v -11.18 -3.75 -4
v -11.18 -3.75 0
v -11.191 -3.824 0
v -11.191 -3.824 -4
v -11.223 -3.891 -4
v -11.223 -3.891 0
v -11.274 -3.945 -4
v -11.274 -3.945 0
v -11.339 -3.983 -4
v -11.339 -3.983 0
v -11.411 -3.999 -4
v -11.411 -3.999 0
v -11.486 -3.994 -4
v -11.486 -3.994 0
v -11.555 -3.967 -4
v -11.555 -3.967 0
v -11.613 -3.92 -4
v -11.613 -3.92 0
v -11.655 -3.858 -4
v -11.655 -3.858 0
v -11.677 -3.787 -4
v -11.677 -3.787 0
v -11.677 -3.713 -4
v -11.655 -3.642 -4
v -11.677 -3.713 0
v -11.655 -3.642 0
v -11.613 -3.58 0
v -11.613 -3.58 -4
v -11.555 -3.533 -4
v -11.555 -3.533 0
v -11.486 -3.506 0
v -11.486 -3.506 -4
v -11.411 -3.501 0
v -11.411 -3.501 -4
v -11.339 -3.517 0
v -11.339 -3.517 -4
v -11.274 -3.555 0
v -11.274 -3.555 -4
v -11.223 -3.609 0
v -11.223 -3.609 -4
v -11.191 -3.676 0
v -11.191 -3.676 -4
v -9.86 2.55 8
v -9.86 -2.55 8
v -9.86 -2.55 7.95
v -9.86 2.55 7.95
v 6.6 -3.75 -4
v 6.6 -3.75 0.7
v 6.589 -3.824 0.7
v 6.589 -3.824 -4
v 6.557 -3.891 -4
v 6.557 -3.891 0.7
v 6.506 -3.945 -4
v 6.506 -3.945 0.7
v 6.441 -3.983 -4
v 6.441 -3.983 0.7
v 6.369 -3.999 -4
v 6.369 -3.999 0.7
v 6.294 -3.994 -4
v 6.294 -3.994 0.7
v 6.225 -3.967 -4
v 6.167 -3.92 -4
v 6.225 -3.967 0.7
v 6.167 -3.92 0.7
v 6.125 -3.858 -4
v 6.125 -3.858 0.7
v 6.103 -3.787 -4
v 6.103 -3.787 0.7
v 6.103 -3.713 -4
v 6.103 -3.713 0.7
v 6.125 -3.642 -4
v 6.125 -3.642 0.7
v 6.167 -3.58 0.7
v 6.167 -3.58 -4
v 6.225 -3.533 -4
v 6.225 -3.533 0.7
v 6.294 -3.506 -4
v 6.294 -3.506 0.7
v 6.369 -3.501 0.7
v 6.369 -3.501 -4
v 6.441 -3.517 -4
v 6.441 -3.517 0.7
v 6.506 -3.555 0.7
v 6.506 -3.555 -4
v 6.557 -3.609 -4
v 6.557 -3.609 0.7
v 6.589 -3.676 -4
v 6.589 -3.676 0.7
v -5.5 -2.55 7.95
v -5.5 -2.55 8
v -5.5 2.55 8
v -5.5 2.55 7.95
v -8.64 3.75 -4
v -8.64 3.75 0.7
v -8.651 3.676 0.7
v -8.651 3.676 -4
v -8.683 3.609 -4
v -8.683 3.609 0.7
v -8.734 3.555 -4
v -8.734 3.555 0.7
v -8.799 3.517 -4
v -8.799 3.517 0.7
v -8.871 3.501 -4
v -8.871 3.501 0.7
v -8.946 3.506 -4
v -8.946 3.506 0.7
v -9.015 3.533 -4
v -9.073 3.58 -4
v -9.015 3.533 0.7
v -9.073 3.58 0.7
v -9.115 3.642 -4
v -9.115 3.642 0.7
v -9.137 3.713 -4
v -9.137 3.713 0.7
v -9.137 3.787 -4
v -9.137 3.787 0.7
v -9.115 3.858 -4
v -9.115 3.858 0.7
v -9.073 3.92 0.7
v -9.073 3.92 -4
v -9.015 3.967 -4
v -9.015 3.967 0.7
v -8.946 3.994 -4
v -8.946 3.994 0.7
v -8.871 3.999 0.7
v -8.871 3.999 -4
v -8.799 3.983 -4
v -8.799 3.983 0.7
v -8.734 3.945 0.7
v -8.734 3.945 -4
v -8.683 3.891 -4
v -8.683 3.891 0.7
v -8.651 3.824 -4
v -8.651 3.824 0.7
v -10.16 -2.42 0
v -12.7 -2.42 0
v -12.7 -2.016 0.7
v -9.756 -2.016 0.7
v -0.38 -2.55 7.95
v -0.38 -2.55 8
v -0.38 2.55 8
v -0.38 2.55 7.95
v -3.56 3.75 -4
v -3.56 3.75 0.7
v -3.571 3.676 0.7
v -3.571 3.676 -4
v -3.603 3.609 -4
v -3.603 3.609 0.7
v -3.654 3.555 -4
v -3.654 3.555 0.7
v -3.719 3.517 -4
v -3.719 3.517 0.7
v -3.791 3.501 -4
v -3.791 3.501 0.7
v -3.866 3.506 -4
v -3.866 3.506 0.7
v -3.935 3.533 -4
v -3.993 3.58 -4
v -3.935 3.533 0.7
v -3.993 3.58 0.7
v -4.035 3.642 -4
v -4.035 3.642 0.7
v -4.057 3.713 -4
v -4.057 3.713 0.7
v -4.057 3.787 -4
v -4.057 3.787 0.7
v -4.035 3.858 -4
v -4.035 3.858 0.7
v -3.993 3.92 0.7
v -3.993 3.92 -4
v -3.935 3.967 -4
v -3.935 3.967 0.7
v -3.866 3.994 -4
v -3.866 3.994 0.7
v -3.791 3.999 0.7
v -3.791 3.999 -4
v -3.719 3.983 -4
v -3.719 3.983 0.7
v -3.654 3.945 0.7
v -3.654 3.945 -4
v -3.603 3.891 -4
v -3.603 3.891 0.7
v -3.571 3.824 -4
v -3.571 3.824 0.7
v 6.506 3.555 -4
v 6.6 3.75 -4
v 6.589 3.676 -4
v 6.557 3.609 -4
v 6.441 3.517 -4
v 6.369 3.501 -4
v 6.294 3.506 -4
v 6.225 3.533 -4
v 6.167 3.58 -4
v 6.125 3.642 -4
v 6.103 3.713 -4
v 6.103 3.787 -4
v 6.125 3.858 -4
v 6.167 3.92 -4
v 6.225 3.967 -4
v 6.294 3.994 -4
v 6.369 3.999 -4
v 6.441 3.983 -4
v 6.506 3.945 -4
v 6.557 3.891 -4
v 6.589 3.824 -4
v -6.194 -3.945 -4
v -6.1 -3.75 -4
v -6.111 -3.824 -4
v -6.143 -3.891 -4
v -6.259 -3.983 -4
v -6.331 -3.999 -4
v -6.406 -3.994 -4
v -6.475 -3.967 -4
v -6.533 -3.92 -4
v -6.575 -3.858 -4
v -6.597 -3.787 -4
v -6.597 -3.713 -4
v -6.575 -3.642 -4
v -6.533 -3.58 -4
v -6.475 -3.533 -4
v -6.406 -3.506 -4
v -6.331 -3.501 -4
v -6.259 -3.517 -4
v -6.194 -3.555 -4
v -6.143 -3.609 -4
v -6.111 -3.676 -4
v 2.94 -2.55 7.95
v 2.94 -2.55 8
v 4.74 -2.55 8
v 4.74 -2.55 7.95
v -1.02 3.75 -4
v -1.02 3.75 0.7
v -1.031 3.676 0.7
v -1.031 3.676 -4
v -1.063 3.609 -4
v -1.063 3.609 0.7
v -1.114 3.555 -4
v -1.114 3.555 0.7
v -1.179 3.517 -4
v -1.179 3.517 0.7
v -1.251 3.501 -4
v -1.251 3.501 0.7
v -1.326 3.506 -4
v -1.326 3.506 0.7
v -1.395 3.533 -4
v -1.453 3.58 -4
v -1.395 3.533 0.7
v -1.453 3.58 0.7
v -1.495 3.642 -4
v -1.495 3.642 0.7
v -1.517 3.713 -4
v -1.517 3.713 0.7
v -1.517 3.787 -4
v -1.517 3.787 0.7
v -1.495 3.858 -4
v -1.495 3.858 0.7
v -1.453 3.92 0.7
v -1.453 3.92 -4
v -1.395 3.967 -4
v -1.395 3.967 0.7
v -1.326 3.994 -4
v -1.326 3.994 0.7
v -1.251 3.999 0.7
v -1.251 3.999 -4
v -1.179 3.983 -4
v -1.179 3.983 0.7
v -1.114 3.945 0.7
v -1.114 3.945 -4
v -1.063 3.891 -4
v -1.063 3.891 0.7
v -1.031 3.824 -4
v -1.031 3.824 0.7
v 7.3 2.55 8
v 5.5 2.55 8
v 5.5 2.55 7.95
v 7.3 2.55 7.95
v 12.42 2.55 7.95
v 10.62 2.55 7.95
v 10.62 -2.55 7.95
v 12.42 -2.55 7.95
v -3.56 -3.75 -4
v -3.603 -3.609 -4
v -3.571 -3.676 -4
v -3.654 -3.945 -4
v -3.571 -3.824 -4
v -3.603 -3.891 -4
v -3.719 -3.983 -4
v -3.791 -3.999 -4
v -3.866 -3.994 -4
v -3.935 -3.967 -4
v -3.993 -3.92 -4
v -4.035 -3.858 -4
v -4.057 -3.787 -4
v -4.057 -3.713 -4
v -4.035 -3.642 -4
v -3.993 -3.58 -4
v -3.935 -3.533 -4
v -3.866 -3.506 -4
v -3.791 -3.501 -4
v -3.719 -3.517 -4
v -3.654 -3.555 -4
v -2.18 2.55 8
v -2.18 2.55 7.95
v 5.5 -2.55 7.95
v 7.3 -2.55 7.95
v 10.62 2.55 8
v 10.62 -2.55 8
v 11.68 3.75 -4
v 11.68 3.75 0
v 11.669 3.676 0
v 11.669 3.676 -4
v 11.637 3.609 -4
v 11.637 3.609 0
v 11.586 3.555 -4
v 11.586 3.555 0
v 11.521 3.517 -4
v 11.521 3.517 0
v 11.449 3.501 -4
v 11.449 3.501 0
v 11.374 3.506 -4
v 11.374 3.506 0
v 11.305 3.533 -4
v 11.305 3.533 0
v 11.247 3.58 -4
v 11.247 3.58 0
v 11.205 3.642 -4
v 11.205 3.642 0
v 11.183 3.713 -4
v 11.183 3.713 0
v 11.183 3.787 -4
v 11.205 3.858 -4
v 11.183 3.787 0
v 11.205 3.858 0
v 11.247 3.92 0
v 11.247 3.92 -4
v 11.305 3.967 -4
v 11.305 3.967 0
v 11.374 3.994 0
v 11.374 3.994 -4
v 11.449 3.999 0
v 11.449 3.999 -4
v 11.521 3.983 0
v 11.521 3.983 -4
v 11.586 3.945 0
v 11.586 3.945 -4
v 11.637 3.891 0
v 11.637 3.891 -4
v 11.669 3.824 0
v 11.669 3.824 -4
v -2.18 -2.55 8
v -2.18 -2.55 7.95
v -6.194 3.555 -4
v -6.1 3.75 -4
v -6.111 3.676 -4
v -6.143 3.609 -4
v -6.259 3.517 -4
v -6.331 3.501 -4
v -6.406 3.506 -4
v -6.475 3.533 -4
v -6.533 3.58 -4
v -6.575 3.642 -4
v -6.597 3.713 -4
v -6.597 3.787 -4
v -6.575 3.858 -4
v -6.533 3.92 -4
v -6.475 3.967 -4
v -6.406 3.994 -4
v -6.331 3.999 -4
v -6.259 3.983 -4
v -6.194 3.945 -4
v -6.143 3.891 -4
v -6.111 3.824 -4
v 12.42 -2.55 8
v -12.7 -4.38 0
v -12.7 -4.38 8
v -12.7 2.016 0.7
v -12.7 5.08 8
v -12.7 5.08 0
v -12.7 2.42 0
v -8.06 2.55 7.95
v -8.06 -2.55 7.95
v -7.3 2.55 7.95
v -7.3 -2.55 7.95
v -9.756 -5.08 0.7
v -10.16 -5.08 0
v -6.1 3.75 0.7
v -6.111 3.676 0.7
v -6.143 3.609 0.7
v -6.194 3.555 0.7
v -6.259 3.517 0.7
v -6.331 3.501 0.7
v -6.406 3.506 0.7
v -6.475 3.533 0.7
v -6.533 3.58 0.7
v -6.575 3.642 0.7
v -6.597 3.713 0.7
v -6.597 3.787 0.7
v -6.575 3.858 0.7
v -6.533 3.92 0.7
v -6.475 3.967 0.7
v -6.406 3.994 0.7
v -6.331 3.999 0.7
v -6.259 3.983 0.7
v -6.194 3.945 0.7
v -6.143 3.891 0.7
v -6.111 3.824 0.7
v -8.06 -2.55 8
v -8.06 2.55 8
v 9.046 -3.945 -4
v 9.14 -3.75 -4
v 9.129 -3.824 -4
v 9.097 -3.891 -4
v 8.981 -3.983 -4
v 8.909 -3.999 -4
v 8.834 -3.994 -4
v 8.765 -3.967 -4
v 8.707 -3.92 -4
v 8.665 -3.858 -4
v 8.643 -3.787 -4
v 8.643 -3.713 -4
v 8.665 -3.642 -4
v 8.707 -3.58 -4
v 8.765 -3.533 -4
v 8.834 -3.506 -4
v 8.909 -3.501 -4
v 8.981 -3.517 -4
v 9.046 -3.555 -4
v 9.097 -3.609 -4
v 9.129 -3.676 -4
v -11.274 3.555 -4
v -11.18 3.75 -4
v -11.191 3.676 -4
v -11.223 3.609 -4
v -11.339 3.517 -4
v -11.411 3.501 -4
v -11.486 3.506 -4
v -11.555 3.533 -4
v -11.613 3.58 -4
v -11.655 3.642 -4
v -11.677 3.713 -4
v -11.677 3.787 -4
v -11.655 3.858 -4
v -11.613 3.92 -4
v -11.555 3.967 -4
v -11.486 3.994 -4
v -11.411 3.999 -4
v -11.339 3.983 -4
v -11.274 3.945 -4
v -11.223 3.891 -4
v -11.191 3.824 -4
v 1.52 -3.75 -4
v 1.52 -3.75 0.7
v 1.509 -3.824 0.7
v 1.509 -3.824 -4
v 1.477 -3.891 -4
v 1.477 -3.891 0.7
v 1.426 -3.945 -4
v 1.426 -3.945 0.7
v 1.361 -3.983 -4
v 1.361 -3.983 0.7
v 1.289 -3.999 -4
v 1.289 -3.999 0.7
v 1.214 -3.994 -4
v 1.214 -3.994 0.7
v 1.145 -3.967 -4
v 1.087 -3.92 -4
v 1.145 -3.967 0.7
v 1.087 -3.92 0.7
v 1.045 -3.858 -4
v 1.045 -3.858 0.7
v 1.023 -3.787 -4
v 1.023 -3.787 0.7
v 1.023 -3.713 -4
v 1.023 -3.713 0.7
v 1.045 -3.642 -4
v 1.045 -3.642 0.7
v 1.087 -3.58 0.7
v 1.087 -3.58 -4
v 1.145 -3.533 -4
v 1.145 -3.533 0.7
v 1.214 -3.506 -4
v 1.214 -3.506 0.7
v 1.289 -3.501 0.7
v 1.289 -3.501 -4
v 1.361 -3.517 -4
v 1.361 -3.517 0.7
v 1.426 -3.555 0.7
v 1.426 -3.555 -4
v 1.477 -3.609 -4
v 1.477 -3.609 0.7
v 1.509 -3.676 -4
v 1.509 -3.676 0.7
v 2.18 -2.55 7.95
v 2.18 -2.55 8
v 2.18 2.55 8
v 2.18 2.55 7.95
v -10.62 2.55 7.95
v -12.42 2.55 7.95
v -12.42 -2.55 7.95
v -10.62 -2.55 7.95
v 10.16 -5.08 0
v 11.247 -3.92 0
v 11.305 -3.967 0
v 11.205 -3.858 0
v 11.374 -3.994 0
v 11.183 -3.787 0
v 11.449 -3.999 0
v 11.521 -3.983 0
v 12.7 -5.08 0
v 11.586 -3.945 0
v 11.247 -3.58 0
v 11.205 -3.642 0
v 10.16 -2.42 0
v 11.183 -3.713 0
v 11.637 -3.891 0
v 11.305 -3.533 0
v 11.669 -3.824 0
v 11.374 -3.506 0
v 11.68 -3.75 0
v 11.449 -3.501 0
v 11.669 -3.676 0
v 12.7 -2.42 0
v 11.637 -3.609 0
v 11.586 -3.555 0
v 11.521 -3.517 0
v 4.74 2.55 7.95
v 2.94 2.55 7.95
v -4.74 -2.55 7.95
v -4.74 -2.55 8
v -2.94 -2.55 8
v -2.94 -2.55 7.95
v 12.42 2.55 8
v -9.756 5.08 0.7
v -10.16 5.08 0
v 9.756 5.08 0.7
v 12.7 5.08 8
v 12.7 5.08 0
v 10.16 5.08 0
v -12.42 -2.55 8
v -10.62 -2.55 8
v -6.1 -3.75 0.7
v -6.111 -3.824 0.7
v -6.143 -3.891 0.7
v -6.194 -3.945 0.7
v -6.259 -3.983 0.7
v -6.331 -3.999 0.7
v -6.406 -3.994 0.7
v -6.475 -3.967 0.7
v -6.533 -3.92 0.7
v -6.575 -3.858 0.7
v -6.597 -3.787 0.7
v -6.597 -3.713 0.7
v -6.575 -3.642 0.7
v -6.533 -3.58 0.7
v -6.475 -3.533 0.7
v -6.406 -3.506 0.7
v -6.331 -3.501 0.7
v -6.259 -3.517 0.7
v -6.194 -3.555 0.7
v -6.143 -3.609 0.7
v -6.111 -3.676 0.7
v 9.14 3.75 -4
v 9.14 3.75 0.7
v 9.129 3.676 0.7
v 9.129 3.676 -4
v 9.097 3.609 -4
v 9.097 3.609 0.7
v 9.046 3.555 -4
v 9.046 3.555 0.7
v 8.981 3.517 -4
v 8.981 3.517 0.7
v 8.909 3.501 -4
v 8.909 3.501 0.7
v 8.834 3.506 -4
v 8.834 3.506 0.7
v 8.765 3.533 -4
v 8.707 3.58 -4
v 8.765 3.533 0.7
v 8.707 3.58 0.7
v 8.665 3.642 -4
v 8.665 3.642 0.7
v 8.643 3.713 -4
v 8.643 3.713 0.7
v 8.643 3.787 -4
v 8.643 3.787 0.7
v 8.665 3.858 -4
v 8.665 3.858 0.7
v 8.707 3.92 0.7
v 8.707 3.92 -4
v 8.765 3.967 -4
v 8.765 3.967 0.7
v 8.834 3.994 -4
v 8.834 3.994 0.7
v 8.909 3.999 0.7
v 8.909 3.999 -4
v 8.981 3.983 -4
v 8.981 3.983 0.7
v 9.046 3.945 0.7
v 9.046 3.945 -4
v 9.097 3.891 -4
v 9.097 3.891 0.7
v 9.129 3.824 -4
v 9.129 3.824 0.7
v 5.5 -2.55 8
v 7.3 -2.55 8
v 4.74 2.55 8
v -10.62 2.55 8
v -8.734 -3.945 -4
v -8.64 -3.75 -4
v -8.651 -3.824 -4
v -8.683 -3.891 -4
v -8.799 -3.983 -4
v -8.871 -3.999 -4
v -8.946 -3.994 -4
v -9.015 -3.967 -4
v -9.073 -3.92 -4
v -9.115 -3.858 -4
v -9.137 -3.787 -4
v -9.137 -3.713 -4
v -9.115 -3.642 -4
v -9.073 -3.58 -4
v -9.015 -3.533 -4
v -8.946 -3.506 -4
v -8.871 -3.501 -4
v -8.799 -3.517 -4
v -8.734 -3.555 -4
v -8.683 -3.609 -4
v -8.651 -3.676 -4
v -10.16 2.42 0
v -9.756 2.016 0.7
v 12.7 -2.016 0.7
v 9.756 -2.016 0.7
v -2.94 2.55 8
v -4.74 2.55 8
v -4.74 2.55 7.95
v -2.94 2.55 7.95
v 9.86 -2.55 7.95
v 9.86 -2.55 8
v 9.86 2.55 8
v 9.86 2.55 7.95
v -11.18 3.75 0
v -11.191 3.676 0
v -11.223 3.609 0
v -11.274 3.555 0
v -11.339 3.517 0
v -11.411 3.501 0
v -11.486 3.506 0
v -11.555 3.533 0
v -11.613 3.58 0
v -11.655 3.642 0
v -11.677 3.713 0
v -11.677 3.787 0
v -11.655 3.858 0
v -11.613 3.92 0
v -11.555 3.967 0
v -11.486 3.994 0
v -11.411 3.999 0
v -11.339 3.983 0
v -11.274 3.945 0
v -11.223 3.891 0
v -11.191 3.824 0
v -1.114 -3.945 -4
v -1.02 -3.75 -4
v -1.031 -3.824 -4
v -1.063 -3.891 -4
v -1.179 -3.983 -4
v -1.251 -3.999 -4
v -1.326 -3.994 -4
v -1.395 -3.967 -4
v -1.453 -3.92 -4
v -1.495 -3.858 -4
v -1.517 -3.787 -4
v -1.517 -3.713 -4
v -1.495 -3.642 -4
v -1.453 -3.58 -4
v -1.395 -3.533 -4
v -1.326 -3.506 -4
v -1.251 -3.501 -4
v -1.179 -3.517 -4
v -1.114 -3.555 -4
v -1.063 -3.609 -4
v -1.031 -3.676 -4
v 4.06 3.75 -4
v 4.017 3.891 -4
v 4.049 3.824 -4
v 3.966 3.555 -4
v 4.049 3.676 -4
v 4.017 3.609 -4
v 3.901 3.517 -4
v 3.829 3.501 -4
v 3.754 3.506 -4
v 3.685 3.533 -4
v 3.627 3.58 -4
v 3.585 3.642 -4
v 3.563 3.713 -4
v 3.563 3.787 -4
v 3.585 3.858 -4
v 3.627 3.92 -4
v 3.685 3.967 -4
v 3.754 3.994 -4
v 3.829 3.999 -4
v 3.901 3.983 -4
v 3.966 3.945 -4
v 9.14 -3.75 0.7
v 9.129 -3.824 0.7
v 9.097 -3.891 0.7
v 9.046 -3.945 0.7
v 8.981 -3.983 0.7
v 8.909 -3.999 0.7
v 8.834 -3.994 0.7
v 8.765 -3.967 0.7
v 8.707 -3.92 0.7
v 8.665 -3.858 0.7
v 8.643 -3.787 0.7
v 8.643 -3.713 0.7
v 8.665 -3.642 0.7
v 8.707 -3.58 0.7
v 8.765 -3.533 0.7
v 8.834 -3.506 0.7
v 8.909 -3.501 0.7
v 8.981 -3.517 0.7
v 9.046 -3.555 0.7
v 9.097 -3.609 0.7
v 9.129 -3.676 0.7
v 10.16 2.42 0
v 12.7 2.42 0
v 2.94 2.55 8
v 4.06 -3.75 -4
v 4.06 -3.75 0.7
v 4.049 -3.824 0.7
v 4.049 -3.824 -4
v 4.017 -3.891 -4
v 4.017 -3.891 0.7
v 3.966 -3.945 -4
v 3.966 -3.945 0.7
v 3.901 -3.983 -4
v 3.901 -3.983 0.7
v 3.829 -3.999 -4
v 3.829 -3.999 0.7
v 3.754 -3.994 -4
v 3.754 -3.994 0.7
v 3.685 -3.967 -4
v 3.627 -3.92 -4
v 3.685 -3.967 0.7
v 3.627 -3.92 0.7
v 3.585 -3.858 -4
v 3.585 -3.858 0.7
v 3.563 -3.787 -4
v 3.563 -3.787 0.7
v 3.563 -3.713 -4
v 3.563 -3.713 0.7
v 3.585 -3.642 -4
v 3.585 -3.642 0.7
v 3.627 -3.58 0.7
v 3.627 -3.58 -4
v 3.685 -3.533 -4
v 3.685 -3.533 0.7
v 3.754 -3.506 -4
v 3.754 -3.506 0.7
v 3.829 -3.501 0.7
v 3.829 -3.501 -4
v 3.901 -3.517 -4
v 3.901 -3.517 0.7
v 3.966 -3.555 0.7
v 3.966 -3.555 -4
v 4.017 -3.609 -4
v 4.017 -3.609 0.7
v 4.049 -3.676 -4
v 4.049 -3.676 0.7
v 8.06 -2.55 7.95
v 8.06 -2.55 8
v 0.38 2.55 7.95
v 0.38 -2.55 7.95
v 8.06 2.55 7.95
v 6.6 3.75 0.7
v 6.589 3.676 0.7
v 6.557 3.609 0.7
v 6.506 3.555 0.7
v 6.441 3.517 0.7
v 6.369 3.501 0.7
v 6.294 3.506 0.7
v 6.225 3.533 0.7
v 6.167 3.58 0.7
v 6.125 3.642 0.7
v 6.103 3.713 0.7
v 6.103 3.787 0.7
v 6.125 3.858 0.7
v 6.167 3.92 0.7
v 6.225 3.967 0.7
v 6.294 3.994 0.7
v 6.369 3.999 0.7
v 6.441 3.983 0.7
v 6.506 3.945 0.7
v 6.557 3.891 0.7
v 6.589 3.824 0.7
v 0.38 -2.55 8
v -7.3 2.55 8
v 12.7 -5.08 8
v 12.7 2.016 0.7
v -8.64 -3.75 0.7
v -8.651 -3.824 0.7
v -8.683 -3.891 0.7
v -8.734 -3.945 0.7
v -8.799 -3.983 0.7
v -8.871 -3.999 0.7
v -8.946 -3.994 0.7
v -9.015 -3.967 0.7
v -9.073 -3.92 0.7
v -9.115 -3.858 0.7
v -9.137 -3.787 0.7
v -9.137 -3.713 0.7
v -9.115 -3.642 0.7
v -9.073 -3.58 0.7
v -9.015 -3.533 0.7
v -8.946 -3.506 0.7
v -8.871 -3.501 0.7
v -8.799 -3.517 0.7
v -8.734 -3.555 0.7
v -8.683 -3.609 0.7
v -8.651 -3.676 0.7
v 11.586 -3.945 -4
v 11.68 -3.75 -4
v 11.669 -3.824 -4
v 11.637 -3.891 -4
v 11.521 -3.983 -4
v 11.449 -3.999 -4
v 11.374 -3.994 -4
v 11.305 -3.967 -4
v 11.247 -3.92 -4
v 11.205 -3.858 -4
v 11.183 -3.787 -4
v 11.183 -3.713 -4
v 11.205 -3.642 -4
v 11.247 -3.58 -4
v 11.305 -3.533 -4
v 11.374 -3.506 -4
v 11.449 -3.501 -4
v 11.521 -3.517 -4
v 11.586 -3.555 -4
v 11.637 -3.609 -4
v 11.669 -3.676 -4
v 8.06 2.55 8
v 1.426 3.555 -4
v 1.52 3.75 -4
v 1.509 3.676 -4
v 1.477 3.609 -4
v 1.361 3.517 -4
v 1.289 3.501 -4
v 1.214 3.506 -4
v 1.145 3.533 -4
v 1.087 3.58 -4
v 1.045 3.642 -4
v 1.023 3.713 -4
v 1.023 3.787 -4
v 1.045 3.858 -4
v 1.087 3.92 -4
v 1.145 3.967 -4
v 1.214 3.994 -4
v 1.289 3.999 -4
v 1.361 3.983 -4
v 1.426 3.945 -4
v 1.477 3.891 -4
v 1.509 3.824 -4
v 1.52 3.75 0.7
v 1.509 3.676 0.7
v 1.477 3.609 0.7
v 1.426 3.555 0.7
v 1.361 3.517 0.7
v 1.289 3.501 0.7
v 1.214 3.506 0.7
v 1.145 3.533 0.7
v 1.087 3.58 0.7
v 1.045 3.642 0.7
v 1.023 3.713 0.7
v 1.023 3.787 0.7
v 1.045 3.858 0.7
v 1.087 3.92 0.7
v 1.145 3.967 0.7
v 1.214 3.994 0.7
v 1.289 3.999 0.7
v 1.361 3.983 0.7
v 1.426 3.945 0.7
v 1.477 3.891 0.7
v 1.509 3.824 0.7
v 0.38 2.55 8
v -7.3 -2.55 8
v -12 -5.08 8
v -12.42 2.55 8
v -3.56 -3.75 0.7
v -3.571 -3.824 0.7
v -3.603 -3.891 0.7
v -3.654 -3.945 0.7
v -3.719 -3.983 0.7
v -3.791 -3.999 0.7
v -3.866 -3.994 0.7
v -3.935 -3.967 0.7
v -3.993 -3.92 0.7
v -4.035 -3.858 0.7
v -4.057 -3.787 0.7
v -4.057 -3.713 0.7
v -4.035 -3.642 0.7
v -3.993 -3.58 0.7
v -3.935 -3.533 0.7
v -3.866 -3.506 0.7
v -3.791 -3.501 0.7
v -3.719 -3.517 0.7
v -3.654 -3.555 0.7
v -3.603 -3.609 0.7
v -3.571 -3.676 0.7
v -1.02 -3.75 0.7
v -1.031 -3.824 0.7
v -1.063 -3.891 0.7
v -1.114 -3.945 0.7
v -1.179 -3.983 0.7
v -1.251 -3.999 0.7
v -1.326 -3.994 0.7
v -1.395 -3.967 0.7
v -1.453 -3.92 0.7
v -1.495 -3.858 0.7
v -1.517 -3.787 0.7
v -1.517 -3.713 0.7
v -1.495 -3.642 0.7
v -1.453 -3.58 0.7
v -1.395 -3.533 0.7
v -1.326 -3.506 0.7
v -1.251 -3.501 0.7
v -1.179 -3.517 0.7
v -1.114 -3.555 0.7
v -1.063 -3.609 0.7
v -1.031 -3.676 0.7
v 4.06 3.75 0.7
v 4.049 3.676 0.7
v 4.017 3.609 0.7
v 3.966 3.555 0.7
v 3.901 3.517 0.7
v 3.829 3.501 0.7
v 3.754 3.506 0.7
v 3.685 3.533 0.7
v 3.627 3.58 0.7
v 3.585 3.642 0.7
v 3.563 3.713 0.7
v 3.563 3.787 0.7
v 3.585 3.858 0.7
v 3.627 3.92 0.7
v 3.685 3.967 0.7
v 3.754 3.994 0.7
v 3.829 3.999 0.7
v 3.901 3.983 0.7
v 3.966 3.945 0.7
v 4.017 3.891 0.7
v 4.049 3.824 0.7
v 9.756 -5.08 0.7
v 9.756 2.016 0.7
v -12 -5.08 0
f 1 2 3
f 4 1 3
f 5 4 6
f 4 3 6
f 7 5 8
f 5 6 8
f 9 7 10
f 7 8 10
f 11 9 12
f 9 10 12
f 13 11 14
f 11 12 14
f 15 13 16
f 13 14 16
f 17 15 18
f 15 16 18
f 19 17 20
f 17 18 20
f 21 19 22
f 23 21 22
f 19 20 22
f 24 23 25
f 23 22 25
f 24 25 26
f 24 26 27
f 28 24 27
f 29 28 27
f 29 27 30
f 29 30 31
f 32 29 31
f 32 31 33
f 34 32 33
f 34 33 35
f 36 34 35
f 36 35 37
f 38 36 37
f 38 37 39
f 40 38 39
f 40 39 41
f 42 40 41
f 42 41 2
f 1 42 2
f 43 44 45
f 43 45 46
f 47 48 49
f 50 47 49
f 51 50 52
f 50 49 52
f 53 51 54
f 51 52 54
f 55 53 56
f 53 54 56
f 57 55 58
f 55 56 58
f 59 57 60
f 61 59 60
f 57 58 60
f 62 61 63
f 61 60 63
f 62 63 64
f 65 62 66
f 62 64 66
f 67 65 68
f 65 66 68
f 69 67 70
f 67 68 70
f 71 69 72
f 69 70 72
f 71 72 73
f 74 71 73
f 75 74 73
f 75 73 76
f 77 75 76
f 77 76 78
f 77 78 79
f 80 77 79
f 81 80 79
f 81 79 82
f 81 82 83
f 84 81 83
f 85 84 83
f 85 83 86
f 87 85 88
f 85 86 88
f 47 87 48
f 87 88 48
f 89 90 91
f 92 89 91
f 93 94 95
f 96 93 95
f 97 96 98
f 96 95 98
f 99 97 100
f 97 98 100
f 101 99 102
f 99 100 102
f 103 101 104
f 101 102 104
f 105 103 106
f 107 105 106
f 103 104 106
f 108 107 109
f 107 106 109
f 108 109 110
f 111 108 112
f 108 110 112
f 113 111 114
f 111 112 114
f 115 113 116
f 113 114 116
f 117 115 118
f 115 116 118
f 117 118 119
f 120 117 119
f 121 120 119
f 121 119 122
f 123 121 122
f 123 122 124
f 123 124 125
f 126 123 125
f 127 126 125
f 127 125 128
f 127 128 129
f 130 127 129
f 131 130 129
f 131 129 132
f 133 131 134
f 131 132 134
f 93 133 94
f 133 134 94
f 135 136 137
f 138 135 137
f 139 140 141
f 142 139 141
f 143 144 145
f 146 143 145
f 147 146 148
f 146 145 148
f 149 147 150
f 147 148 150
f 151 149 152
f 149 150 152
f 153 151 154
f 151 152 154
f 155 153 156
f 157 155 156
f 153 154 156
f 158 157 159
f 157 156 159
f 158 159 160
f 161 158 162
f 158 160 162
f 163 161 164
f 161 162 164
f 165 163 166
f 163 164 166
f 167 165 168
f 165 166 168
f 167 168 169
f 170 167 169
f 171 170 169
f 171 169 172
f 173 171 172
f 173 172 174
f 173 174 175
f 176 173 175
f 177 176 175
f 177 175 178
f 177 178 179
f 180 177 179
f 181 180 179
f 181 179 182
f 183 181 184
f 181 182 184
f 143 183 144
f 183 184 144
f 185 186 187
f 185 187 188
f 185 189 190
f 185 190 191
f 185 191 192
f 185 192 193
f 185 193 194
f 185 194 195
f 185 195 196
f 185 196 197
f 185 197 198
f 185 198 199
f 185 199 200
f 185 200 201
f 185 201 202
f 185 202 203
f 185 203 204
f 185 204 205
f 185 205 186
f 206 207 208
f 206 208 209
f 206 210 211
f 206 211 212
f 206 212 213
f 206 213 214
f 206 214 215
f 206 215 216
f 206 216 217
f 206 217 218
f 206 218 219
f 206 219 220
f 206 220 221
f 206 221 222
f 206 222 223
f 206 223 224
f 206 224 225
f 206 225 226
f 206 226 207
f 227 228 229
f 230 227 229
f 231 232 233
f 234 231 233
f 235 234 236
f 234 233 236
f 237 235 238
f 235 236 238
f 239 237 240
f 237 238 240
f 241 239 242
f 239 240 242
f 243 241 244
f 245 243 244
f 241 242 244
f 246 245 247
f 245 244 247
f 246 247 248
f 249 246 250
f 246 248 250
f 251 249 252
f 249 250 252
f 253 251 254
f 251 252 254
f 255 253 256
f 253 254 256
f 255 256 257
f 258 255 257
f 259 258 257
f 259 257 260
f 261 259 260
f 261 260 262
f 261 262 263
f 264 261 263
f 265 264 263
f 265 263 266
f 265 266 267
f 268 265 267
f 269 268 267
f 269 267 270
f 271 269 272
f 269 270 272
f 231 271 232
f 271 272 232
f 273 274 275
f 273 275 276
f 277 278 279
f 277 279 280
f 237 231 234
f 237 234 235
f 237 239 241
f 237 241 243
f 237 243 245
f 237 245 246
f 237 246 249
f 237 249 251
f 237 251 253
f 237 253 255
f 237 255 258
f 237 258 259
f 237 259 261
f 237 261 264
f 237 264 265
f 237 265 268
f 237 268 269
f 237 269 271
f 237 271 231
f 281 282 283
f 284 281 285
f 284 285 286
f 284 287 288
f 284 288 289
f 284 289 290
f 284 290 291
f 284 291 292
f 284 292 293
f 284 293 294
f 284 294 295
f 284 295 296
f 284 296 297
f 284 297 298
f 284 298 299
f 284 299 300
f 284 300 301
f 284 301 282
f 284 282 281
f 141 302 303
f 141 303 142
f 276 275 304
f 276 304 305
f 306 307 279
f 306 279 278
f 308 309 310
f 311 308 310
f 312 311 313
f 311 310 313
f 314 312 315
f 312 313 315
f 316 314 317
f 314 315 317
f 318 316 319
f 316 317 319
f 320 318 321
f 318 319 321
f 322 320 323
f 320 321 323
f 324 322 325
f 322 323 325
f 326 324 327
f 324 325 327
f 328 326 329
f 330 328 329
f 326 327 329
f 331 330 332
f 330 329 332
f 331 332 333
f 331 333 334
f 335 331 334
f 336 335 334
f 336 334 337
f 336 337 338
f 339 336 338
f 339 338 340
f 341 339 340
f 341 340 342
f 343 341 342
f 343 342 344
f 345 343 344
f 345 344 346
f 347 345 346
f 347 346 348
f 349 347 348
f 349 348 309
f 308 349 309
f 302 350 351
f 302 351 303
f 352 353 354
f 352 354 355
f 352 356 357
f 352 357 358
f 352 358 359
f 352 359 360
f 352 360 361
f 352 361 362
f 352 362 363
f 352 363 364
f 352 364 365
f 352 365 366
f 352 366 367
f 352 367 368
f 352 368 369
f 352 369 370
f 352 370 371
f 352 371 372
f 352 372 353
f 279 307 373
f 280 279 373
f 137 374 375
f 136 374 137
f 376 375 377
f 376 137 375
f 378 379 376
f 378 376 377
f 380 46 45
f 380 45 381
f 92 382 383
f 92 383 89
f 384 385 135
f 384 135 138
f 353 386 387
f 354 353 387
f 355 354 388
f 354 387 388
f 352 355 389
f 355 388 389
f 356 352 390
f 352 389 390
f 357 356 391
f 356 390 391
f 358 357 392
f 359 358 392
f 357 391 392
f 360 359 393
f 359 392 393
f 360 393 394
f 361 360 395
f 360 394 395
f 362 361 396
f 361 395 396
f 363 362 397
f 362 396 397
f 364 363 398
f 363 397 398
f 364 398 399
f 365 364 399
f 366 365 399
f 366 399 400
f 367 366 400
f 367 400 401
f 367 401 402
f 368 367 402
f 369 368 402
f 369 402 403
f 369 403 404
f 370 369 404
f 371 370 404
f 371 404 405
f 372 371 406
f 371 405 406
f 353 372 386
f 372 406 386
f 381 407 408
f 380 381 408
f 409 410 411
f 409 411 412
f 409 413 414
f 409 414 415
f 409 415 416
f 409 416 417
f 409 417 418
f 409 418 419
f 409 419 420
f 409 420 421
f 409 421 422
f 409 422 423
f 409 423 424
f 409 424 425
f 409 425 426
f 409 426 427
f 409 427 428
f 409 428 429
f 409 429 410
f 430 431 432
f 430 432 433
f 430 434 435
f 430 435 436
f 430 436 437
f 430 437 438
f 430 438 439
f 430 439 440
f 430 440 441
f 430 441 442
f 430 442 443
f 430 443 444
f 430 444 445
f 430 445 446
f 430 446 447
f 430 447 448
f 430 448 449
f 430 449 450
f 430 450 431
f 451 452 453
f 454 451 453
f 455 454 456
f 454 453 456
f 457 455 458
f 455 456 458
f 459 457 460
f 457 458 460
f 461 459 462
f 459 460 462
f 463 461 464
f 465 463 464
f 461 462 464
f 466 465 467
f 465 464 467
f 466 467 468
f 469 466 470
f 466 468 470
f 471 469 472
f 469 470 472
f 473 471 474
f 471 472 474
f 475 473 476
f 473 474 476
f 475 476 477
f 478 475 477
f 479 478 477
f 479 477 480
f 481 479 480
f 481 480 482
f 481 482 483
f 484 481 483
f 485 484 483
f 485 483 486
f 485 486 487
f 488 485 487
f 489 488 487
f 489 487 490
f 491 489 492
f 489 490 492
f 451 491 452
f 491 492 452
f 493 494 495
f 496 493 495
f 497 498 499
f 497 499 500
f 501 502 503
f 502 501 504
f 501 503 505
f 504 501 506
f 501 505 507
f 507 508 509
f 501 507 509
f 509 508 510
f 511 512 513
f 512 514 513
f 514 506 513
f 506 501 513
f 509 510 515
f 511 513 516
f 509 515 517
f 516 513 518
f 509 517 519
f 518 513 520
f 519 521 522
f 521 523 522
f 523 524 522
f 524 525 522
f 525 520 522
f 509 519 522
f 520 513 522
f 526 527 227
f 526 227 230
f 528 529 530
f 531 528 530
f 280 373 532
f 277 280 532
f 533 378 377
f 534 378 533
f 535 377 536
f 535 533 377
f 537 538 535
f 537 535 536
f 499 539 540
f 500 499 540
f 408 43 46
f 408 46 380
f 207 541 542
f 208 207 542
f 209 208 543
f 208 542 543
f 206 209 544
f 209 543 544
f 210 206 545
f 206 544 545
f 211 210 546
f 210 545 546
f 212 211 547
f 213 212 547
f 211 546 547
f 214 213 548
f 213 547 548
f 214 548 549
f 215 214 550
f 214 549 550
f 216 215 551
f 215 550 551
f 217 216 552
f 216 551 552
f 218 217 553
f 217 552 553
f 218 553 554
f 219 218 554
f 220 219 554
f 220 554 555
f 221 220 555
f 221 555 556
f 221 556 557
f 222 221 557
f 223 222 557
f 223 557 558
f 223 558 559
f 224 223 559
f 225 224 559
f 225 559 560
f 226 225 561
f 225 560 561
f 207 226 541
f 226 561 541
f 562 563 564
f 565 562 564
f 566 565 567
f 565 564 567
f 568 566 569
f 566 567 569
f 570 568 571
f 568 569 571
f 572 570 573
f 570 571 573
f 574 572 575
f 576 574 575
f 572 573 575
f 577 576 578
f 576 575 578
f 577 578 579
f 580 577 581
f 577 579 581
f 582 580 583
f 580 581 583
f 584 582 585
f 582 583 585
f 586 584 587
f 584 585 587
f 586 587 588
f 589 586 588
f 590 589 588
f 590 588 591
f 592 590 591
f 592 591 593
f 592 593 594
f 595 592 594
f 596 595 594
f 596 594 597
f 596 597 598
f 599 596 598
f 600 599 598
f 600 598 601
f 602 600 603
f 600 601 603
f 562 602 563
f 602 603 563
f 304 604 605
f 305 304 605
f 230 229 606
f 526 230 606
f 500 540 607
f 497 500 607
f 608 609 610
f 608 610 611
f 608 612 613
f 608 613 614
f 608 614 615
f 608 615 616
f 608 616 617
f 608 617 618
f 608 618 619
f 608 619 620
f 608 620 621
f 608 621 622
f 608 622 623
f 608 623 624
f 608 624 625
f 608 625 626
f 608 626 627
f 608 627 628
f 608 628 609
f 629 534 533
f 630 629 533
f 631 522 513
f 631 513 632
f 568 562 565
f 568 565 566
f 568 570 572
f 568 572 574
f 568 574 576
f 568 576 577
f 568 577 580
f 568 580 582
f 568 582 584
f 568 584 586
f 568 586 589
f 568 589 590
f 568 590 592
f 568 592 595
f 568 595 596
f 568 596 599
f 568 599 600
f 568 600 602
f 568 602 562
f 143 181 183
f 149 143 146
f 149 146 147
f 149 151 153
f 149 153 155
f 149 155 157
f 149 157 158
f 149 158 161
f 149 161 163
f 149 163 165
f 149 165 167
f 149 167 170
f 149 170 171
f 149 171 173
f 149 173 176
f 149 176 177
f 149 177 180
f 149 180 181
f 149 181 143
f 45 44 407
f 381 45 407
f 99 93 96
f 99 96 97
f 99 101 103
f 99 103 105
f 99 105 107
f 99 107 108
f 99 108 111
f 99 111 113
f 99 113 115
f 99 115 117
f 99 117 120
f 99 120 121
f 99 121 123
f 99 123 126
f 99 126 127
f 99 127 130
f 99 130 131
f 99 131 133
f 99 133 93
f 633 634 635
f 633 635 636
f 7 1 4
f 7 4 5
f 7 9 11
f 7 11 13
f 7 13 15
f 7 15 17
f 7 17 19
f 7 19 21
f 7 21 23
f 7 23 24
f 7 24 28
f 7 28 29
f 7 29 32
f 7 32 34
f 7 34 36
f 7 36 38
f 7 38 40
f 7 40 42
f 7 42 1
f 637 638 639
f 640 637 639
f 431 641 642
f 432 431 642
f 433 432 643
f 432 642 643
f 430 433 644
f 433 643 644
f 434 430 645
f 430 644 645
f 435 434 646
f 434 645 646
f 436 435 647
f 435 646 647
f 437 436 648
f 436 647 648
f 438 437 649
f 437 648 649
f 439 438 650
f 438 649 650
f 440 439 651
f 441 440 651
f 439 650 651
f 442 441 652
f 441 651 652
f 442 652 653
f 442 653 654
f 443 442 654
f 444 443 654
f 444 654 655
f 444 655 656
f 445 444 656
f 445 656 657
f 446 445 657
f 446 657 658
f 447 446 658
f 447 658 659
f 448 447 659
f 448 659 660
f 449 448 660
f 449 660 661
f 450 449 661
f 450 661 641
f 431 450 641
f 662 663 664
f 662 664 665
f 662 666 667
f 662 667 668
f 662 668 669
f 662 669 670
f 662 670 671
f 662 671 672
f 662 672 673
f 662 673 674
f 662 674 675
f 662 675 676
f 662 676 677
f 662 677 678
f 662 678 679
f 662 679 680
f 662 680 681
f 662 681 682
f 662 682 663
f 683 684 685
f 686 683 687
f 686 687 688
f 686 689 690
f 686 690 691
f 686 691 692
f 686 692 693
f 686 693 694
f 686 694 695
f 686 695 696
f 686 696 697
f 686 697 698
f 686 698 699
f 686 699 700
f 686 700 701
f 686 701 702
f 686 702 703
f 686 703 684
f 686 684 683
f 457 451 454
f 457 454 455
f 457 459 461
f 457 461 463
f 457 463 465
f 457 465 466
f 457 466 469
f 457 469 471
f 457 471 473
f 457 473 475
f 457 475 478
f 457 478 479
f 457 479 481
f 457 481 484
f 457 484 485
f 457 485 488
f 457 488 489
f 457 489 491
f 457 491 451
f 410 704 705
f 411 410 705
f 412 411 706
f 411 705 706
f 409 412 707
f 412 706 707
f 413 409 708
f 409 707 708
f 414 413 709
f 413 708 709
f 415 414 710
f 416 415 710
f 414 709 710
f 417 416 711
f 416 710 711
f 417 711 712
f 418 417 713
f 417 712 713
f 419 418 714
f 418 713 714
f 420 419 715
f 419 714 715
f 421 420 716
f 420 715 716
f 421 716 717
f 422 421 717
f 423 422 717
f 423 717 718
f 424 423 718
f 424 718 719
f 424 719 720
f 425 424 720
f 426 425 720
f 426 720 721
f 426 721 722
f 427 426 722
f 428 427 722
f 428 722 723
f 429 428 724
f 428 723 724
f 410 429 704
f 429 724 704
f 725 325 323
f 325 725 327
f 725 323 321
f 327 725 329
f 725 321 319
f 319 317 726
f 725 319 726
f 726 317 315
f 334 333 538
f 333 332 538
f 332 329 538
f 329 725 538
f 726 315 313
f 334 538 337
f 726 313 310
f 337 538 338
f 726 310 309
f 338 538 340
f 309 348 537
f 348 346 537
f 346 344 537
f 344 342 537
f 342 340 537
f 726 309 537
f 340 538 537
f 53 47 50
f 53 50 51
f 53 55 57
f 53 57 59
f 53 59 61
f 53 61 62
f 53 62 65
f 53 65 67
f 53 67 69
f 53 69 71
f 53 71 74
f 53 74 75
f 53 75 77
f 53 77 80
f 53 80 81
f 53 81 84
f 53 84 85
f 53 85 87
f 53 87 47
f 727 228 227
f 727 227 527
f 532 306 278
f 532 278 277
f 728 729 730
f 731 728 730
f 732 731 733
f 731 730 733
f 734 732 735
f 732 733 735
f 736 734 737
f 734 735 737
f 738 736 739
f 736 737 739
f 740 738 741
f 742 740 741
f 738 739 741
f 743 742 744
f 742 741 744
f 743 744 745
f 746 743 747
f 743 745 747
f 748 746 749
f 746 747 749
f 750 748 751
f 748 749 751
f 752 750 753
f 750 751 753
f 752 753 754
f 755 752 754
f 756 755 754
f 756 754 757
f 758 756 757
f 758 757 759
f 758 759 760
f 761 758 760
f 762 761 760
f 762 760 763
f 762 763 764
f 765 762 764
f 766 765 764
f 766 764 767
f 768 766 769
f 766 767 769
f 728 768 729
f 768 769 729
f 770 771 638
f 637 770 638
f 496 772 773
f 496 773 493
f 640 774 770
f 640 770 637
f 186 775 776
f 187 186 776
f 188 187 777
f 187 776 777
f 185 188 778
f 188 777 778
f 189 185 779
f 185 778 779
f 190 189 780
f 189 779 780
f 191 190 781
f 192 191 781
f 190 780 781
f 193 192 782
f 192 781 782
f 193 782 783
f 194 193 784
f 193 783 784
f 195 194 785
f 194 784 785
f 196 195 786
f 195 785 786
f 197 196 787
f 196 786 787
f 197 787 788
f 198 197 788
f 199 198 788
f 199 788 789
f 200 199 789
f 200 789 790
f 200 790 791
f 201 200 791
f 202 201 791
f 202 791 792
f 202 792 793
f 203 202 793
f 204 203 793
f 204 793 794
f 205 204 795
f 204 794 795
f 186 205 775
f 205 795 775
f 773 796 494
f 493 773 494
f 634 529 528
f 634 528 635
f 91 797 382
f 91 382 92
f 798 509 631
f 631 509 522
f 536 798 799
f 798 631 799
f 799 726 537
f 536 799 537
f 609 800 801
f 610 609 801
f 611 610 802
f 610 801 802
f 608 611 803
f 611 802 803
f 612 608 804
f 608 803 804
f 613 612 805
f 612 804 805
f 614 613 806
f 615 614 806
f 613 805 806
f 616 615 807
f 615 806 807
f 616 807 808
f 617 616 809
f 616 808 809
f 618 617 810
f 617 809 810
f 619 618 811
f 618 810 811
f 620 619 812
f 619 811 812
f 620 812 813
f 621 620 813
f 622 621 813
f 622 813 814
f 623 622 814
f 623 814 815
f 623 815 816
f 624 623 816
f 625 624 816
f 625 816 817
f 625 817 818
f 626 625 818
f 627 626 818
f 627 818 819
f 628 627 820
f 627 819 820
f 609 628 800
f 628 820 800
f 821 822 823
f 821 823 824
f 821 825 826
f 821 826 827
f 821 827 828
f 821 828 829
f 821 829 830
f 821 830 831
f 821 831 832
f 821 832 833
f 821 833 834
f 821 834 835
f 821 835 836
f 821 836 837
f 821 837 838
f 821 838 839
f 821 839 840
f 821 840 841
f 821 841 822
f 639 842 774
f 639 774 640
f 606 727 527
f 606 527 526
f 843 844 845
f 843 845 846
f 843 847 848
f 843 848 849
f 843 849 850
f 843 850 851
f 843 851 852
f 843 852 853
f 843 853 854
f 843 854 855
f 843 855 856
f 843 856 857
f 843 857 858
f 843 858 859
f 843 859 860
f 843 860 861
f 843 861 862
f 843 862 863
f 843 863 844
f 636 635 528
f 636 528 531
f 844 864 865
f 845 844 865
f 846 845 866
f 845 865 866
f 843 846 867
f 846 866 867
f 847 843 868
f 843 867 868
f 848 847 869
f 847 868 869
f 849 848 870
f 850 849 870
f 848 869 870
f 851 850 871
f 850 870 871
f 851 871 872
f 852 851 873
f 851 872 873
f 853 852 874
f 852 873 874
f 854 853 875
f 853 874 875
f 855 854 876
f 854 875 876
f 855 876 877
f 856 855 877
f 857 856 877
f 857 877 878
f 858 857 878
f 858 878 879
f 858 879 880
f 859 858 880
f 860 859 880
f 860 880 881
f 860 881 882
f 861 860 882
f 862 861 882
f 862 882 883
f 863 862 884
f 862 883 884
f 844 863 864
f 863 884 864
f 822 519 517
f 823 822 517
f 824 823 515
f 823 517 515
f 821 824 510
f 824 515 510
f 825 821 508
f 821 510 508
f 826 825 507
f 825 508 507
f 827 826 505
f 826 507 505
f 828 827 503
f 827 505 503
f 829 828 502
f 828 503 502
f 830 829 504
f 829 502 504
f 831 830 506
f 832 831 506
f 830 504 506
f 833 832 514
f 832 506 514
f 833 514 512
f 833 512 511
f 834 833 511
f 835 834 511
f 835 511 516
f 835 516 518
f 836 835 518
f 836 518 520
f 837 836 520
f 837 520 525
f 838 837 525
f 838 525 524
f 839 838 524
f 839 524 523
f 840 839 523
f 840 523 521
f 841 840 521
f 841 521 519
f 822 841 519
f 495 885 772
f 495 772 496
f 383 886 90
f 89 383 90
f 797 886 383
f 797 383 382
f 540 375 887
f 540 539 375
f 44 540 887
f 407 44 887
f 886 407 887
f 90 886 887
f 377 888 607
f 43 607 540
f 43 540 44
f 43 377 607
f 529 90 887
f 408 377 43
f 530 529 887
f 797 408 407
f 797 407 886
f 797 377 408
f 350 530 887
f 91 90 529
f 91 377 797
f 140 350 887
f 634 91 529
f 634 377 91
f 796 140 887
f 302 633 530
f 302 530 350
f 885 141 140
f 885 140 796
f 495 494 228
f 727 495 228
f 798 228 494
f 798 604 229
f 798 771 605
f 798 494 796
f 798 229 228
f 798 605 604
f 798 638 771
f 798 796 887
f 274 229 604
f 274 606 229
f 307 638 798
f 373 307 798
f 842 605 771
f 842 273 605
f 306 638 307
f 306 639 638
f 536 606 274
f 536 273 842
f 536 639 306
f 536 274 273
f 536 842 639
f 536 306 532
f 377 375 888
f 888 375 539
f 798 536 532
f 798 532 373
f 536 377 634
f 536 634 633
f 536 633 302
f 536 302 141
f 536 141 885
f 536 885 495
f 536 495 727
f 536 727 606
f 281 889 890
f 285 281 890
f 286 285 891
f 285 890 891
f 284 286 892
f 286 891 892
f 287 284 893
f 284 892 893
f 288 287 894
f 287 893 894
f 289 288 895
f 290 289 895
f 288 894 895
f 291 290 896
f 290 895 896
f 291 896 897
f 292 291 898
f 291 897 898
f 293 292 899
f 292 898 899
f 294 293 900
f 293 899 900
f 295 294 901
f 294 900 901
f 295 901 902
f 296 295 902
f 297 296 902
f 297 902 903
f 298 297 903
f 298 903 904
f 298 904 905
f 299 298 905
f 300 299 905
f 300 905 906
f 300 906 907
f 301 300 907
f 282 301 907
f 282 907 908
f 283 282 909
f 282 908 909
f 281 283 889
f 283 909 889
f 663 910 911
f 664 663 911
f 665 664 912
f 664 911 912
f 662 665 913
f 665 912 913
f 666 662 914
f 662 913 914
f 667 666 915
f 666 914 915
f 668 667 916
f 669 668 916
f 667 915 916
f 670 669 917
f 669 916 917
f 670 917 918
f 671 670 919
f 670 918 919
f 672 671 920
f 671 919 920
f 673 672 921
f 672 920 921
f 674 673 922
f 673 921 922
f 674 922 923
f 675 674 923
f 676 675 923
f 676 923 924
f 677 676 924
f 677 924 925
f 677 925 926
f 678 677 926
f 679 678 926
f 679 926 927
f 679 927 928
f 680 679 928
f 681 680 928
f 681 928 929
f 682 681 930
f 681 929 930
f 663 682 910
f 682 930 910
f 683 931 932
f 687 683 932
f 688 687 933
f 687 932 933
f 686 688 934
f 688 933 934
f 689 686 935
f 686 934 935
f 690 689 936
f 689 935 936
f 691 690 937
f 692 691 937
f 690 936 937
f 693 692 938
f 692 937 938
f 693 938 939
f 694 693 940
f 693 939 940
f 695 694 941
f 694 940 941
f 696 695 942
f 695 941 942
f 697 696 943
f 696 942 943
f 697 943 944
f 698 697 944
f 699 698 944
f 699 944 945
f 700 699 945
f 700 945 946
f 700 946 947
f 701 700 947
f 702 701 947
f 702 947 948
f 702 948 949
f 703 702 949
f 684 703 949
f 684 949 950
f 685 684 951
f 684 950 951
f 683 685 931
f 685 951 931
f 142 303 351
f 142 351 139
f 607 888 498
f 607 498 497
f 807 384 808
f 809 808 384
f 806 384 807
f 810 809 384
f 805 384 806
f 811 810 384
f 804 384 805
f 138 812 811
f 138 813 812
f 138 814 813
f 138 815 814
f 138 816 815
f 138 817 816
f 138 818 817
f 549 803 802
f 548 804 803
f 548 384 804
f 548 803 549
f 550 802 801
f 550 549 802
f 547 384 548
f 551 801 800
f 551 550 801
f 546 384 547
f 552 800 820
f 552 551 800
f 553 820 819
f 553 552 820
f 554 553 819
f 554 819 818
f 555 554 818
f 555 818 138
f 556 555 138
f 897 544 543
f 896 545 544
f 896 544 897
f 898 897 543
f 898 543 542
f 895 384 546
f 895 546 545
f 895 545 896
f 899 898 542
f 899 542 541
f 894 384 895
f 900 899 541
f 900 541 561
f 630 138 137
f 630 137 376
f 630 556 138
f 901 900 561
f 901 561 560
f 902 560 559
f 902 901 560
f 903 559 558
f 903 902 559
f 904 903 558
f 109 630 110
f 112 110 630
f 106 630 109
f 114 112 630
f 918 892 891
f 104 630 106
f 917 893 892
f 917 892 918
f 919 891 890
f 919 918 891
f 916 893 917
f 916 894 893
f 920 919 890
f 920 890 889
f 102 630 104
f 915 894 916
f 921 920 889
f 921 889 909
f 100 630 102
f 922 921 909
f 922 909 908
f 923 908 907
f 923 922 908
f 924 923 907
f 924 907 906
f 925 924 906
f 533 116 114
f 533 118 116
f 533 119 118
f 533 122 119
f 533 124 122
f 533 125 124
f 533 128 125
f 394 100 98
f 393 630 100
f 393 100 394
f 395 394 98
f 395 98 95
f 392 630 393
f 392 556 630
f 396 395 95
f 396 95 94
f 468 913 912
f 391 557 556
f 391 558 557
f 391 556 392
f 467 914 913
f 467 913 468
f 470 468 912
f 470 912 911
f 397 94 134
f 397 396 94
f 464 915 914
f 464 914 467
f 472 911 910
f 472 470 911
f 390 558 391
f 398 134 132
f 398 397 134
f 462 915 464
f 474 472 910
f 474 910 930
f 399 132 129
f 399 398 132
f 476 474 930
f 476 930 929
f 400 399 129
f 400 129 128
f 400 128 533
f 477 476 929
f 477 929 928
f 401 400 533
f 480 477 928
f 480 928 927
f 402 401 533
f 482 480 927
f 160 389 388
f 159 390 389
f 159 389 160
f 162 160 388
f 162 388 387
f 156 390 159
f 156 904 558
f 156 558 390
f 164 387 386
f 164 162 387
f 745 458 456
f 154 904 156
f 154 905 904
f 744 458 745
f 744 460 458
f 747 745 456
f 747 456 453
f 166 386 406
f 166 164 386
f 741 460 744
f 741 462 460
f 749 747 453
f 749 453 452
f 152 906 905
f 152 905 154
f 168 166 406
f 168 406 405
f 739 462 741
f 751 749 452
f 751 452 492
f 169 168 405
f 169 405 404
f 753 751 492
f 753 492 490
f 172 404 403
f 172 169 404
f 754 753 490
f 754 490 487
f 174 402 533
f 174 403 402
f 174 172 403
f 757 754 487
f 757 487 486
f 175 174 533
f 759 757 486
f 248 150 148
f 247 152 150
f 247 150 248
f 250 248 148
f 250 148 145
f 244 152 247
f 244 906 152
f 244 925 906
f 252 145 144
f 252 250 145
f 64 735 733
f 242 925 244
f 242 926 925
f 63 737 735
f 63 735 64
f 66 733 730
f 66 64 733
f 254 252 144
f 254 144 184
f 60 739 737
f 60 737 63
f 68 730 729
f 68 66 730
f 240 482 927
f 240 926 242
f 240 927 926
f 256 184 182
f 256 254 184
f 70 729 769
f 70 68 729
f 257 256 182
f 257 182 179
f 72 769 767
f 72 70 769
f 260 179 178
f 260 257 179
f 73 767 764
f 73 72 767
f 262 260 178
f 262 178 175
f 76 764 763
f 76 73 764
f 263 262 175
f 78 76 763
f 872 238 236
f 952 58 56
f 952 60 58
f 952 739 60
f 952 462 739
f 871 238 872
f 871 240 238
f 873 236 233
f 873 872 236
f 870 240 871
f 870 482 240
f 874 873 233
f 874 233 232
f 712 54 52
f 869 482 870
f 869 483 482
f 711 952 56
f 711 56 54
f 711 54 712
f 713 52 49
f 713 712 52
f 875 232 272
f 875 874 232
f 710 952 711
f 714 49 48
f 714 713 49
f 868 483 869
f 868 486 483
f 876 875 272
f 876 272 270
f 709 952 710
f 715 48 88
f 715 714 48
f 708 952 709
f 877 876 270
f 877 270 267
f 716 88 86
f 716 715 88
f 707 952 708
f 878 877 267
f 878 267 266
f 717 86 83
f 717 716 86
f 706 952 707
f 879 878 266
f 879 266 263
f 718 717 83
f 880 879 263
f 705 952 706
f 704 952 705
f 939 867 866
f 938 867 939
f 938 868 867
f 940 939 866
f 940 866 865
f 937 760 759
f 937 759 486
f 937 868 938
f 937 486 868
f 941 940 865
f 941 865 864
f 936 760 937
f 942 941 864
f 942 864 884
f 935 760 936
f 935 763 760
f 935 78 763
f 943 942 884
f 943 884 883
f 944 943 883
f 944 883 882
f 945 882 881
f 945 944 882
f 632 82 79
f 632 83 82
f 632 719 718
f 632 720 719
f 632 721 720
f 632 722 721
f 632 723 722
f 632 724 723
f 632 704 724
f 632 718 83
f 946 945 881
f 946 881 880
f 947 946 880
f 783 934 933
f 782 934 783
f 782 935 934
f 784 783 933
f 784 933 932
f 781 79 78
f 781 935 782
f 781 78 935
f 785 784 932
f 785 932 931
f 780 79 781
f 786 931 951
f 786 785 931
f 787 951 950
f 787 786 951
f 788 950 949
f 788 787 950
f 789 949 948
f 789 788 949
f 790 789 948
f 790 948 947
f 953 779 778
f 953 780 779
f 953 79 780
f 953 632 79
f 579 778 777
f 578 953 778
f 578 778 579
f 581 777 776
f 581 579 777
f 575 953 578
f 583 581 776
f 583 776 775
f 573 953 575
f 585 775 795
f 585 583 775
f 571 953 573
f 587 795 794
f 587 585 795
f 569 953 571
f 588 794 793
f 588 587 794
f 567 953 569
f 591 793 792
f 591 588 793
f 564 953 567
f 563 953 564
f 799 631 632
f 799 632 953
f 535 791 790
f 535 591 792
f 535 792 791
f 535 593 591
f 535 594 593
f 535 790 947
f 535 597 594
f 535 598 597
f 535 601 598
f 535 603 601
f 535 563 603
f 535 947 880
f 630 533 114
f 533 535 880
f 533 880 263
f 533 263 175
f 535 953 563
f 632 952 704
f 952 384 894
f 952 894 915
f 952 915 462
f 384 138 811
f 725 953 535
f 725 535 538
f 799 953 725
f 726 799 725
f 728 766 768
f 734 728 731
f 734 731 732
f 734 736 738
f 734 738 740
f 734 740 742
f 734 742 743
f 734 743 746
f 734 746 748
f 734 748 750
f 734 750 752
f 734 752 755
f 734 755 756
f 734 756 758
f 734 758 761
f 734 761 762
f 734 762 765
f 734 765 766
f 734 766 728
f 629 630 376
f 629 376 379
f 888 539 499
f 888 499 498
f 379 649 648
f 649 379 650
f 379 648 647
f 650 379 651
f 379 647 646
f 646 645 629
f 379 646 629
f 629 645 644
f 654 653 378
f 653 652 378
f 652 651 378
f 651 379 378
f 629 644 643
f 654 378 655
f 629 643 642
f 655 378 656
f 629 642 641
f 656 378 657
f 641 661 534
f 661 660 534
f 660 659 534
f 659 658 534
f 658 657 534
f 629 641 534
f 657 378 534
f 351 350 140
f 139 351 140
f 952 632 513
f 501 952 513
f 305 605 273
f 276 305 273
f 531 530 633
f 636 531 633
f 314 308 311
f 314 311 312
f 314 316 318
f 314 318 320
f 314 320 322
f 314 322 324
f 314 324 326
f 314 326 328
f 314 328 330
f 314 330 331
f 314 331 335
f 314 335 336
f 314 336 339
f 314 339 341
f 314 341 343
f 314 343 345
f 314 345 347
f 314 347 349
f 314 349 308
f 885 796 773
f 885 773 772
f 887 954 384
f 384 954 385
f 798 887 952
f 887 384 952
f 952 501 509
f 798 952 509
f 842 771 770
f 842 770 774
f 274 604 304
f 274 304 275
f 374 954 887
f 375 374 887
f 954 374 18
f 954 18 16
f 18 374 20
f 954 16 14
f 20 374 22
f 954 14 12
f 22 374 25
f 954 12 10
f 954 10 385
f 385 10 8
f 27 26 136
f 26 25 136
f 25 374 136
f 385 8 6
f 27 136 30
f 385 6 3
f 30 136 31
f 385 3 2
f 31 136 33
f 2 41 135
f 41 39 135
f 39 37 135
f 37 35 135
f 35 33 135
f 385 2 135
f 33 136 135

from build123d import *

# Parameters (mm, degrees)
SKETCH_W        = 25.4
SKETCH_H        = 10.16
PAD_DEPTH       = 8
SKETCH001_W     = 1.8
SKETCH001_H     = 5.1
POCKET_DEPTH    = 0.05
CHAMFER_SIZE    = 0.7
POCKET001_DEPTH = 10.161
POCKET002_DEPTH = 25.401
SKETCH004_R     = 0.25
PAD001_DEPTH    = 4.7


with BuildPart() as part:
    # Sketch → Pad (new body)
    with BuildSketch(Plane.XY):
        Rectangle(SKETCH_W, SKETCH_H)
    extrude(amount=PAD_DEPTH)

    # Sketch001 (on Face6 of Pad) → Pocket (cut)
    with BuildSketch(Plane.XY.offset(8)):
        with Locations((-11.52, 0)):
            Rectangle(SKETCH001_W, SKETCH001_H)
        with Locations((-6.4, 0)):
            Rectangle(SKETCH001_W, SKETCH001_H)
        with Locations((-3.84, 0)):
            Rectangle(SKETCH001_W, SKETCH001_H)
        with Locations((-1.28, 0)):
            Rectangle(SKETCH001_W, SKETCH001_H)
        with Locations((1.28, 0)):
            Rectangle(SKETCH001_W, SKETCH001_H)
        with Locations((3.84, 0)):
            Rectangle(SKETCH001_W, SKETCH001_H)
        with Locations((6.4, 0)):
            Rectangle(SKETCH001_W, SKETCH001_H)
        with Locations((8.96, 0)):
            Rectangle(SKETCH001_W, SKETCH001_H)
        with Locations((11.52, 0)):
            Rectangle(SKETCH001_W, SKETCH001_H)
        with Locations((-8.96, 0)):
            Rectangle(SKETCH001_W, SKETCH001_H)
    extrude(amount=-POCKET_DEPTH, mode=Mode.SUBTRACT)

    # Chamfer
    chamfer_edges = [part.edges().sort_by_distance(p)[0] for p in [
        (-12.7, -5.08, 4),
    ]]
    chamfer(chamfer_edges, length=CHAMFER_SIZE)

    # Sketch002 (on Face6 of Chamfer) → Pocket001 (cut, through all)
    with BuildSketch(Plane.XZ.offset(5.08)):
        Polygon((-10.16, 0), (-9.755855, 0.7), (9.755855, 0.7), (10.16, 0), align=None)
    extrude(amount=-POCKET001_DEPTH, mode=Mode.SUBTRACT)

    # Sketch003 (on Face11 of Pocket001) → Pocket002 (cut, through all)
    with BuildSketch(Plane.YZ.offset(12.7)):
        Polygon((-2.42, 0), (-2.015855, 0.7), (2.015855, 0.7), (2.42, 0), align=None)
    extrude(amount=-POCKET002_DEPTH, mode=Mode.SUBTRACT)

    # Sketch004 (on Face58 of Pocket002) → Pad001 (join)
    with BuildSketch(Plane(origin=(0, 0, 0.7), x_dir=(1, 0, 0), z_dir=(0, 0, -1))):
        with Locations((-11.43, 3.75)):
            Circle(SKETCH004_R)
        with Locations((-8.89, 3.75)):
            Circle(SKETCH004_R)
        with Locations((-6.35, 3.75)):
            Circle(SKETCH004_R)
        with Locations((-3.81, 3.75)):
            Circle(SKETCH004_R)
        with Locations((-1.27, 3.75)):
            Circle(SKETCH004_R)
        with Locations((1.27, 3.75)):
            Circle(SKETCH004_R)
        with Locations((3.81, 3.75)):
            Circle(SKETCH004_R)
        with Locations((6.35, 3.75)):
            Circle(SKETCH004_R)
        with Locations((8.89, 3.75)):
            Circle(SKETCH004_R)
        with Locations((11.43, 3.75)):
            Circle(SKETCH004_R)
        with Locations((-11.43, -3.75)):
            Circle(SKETCH004_R)
        with Locations((-8.89, -3.75)):
            Circle(SKETCH004_R)
        with Locations((-6.35, -3.75)):
            Circle(SKETCH004_R)
        with Locations((-3.81, -3.75)):
            Circle(SKETCH004_R)
        with Locations((-1.27, -3.75)):
            Circle(SKETCH004_R)
        with Locations((1.27, -3.75)):
            Circle(SKETCH004_R)
        with Locations((3.81, -3.75)):
            Circle(SKETCH004_R)
        with Locations((6.35, -3.75)):
            Circle(SKETCH004_R)
        with Locations((8.89, -3.75)):
            Circle(SKETCH004_R)
        with Locations((11.43, -3.75)):
            Circle(SKETCH004_R)
    extrude(amount=PAD001_DEPTH)


solid = part.part
